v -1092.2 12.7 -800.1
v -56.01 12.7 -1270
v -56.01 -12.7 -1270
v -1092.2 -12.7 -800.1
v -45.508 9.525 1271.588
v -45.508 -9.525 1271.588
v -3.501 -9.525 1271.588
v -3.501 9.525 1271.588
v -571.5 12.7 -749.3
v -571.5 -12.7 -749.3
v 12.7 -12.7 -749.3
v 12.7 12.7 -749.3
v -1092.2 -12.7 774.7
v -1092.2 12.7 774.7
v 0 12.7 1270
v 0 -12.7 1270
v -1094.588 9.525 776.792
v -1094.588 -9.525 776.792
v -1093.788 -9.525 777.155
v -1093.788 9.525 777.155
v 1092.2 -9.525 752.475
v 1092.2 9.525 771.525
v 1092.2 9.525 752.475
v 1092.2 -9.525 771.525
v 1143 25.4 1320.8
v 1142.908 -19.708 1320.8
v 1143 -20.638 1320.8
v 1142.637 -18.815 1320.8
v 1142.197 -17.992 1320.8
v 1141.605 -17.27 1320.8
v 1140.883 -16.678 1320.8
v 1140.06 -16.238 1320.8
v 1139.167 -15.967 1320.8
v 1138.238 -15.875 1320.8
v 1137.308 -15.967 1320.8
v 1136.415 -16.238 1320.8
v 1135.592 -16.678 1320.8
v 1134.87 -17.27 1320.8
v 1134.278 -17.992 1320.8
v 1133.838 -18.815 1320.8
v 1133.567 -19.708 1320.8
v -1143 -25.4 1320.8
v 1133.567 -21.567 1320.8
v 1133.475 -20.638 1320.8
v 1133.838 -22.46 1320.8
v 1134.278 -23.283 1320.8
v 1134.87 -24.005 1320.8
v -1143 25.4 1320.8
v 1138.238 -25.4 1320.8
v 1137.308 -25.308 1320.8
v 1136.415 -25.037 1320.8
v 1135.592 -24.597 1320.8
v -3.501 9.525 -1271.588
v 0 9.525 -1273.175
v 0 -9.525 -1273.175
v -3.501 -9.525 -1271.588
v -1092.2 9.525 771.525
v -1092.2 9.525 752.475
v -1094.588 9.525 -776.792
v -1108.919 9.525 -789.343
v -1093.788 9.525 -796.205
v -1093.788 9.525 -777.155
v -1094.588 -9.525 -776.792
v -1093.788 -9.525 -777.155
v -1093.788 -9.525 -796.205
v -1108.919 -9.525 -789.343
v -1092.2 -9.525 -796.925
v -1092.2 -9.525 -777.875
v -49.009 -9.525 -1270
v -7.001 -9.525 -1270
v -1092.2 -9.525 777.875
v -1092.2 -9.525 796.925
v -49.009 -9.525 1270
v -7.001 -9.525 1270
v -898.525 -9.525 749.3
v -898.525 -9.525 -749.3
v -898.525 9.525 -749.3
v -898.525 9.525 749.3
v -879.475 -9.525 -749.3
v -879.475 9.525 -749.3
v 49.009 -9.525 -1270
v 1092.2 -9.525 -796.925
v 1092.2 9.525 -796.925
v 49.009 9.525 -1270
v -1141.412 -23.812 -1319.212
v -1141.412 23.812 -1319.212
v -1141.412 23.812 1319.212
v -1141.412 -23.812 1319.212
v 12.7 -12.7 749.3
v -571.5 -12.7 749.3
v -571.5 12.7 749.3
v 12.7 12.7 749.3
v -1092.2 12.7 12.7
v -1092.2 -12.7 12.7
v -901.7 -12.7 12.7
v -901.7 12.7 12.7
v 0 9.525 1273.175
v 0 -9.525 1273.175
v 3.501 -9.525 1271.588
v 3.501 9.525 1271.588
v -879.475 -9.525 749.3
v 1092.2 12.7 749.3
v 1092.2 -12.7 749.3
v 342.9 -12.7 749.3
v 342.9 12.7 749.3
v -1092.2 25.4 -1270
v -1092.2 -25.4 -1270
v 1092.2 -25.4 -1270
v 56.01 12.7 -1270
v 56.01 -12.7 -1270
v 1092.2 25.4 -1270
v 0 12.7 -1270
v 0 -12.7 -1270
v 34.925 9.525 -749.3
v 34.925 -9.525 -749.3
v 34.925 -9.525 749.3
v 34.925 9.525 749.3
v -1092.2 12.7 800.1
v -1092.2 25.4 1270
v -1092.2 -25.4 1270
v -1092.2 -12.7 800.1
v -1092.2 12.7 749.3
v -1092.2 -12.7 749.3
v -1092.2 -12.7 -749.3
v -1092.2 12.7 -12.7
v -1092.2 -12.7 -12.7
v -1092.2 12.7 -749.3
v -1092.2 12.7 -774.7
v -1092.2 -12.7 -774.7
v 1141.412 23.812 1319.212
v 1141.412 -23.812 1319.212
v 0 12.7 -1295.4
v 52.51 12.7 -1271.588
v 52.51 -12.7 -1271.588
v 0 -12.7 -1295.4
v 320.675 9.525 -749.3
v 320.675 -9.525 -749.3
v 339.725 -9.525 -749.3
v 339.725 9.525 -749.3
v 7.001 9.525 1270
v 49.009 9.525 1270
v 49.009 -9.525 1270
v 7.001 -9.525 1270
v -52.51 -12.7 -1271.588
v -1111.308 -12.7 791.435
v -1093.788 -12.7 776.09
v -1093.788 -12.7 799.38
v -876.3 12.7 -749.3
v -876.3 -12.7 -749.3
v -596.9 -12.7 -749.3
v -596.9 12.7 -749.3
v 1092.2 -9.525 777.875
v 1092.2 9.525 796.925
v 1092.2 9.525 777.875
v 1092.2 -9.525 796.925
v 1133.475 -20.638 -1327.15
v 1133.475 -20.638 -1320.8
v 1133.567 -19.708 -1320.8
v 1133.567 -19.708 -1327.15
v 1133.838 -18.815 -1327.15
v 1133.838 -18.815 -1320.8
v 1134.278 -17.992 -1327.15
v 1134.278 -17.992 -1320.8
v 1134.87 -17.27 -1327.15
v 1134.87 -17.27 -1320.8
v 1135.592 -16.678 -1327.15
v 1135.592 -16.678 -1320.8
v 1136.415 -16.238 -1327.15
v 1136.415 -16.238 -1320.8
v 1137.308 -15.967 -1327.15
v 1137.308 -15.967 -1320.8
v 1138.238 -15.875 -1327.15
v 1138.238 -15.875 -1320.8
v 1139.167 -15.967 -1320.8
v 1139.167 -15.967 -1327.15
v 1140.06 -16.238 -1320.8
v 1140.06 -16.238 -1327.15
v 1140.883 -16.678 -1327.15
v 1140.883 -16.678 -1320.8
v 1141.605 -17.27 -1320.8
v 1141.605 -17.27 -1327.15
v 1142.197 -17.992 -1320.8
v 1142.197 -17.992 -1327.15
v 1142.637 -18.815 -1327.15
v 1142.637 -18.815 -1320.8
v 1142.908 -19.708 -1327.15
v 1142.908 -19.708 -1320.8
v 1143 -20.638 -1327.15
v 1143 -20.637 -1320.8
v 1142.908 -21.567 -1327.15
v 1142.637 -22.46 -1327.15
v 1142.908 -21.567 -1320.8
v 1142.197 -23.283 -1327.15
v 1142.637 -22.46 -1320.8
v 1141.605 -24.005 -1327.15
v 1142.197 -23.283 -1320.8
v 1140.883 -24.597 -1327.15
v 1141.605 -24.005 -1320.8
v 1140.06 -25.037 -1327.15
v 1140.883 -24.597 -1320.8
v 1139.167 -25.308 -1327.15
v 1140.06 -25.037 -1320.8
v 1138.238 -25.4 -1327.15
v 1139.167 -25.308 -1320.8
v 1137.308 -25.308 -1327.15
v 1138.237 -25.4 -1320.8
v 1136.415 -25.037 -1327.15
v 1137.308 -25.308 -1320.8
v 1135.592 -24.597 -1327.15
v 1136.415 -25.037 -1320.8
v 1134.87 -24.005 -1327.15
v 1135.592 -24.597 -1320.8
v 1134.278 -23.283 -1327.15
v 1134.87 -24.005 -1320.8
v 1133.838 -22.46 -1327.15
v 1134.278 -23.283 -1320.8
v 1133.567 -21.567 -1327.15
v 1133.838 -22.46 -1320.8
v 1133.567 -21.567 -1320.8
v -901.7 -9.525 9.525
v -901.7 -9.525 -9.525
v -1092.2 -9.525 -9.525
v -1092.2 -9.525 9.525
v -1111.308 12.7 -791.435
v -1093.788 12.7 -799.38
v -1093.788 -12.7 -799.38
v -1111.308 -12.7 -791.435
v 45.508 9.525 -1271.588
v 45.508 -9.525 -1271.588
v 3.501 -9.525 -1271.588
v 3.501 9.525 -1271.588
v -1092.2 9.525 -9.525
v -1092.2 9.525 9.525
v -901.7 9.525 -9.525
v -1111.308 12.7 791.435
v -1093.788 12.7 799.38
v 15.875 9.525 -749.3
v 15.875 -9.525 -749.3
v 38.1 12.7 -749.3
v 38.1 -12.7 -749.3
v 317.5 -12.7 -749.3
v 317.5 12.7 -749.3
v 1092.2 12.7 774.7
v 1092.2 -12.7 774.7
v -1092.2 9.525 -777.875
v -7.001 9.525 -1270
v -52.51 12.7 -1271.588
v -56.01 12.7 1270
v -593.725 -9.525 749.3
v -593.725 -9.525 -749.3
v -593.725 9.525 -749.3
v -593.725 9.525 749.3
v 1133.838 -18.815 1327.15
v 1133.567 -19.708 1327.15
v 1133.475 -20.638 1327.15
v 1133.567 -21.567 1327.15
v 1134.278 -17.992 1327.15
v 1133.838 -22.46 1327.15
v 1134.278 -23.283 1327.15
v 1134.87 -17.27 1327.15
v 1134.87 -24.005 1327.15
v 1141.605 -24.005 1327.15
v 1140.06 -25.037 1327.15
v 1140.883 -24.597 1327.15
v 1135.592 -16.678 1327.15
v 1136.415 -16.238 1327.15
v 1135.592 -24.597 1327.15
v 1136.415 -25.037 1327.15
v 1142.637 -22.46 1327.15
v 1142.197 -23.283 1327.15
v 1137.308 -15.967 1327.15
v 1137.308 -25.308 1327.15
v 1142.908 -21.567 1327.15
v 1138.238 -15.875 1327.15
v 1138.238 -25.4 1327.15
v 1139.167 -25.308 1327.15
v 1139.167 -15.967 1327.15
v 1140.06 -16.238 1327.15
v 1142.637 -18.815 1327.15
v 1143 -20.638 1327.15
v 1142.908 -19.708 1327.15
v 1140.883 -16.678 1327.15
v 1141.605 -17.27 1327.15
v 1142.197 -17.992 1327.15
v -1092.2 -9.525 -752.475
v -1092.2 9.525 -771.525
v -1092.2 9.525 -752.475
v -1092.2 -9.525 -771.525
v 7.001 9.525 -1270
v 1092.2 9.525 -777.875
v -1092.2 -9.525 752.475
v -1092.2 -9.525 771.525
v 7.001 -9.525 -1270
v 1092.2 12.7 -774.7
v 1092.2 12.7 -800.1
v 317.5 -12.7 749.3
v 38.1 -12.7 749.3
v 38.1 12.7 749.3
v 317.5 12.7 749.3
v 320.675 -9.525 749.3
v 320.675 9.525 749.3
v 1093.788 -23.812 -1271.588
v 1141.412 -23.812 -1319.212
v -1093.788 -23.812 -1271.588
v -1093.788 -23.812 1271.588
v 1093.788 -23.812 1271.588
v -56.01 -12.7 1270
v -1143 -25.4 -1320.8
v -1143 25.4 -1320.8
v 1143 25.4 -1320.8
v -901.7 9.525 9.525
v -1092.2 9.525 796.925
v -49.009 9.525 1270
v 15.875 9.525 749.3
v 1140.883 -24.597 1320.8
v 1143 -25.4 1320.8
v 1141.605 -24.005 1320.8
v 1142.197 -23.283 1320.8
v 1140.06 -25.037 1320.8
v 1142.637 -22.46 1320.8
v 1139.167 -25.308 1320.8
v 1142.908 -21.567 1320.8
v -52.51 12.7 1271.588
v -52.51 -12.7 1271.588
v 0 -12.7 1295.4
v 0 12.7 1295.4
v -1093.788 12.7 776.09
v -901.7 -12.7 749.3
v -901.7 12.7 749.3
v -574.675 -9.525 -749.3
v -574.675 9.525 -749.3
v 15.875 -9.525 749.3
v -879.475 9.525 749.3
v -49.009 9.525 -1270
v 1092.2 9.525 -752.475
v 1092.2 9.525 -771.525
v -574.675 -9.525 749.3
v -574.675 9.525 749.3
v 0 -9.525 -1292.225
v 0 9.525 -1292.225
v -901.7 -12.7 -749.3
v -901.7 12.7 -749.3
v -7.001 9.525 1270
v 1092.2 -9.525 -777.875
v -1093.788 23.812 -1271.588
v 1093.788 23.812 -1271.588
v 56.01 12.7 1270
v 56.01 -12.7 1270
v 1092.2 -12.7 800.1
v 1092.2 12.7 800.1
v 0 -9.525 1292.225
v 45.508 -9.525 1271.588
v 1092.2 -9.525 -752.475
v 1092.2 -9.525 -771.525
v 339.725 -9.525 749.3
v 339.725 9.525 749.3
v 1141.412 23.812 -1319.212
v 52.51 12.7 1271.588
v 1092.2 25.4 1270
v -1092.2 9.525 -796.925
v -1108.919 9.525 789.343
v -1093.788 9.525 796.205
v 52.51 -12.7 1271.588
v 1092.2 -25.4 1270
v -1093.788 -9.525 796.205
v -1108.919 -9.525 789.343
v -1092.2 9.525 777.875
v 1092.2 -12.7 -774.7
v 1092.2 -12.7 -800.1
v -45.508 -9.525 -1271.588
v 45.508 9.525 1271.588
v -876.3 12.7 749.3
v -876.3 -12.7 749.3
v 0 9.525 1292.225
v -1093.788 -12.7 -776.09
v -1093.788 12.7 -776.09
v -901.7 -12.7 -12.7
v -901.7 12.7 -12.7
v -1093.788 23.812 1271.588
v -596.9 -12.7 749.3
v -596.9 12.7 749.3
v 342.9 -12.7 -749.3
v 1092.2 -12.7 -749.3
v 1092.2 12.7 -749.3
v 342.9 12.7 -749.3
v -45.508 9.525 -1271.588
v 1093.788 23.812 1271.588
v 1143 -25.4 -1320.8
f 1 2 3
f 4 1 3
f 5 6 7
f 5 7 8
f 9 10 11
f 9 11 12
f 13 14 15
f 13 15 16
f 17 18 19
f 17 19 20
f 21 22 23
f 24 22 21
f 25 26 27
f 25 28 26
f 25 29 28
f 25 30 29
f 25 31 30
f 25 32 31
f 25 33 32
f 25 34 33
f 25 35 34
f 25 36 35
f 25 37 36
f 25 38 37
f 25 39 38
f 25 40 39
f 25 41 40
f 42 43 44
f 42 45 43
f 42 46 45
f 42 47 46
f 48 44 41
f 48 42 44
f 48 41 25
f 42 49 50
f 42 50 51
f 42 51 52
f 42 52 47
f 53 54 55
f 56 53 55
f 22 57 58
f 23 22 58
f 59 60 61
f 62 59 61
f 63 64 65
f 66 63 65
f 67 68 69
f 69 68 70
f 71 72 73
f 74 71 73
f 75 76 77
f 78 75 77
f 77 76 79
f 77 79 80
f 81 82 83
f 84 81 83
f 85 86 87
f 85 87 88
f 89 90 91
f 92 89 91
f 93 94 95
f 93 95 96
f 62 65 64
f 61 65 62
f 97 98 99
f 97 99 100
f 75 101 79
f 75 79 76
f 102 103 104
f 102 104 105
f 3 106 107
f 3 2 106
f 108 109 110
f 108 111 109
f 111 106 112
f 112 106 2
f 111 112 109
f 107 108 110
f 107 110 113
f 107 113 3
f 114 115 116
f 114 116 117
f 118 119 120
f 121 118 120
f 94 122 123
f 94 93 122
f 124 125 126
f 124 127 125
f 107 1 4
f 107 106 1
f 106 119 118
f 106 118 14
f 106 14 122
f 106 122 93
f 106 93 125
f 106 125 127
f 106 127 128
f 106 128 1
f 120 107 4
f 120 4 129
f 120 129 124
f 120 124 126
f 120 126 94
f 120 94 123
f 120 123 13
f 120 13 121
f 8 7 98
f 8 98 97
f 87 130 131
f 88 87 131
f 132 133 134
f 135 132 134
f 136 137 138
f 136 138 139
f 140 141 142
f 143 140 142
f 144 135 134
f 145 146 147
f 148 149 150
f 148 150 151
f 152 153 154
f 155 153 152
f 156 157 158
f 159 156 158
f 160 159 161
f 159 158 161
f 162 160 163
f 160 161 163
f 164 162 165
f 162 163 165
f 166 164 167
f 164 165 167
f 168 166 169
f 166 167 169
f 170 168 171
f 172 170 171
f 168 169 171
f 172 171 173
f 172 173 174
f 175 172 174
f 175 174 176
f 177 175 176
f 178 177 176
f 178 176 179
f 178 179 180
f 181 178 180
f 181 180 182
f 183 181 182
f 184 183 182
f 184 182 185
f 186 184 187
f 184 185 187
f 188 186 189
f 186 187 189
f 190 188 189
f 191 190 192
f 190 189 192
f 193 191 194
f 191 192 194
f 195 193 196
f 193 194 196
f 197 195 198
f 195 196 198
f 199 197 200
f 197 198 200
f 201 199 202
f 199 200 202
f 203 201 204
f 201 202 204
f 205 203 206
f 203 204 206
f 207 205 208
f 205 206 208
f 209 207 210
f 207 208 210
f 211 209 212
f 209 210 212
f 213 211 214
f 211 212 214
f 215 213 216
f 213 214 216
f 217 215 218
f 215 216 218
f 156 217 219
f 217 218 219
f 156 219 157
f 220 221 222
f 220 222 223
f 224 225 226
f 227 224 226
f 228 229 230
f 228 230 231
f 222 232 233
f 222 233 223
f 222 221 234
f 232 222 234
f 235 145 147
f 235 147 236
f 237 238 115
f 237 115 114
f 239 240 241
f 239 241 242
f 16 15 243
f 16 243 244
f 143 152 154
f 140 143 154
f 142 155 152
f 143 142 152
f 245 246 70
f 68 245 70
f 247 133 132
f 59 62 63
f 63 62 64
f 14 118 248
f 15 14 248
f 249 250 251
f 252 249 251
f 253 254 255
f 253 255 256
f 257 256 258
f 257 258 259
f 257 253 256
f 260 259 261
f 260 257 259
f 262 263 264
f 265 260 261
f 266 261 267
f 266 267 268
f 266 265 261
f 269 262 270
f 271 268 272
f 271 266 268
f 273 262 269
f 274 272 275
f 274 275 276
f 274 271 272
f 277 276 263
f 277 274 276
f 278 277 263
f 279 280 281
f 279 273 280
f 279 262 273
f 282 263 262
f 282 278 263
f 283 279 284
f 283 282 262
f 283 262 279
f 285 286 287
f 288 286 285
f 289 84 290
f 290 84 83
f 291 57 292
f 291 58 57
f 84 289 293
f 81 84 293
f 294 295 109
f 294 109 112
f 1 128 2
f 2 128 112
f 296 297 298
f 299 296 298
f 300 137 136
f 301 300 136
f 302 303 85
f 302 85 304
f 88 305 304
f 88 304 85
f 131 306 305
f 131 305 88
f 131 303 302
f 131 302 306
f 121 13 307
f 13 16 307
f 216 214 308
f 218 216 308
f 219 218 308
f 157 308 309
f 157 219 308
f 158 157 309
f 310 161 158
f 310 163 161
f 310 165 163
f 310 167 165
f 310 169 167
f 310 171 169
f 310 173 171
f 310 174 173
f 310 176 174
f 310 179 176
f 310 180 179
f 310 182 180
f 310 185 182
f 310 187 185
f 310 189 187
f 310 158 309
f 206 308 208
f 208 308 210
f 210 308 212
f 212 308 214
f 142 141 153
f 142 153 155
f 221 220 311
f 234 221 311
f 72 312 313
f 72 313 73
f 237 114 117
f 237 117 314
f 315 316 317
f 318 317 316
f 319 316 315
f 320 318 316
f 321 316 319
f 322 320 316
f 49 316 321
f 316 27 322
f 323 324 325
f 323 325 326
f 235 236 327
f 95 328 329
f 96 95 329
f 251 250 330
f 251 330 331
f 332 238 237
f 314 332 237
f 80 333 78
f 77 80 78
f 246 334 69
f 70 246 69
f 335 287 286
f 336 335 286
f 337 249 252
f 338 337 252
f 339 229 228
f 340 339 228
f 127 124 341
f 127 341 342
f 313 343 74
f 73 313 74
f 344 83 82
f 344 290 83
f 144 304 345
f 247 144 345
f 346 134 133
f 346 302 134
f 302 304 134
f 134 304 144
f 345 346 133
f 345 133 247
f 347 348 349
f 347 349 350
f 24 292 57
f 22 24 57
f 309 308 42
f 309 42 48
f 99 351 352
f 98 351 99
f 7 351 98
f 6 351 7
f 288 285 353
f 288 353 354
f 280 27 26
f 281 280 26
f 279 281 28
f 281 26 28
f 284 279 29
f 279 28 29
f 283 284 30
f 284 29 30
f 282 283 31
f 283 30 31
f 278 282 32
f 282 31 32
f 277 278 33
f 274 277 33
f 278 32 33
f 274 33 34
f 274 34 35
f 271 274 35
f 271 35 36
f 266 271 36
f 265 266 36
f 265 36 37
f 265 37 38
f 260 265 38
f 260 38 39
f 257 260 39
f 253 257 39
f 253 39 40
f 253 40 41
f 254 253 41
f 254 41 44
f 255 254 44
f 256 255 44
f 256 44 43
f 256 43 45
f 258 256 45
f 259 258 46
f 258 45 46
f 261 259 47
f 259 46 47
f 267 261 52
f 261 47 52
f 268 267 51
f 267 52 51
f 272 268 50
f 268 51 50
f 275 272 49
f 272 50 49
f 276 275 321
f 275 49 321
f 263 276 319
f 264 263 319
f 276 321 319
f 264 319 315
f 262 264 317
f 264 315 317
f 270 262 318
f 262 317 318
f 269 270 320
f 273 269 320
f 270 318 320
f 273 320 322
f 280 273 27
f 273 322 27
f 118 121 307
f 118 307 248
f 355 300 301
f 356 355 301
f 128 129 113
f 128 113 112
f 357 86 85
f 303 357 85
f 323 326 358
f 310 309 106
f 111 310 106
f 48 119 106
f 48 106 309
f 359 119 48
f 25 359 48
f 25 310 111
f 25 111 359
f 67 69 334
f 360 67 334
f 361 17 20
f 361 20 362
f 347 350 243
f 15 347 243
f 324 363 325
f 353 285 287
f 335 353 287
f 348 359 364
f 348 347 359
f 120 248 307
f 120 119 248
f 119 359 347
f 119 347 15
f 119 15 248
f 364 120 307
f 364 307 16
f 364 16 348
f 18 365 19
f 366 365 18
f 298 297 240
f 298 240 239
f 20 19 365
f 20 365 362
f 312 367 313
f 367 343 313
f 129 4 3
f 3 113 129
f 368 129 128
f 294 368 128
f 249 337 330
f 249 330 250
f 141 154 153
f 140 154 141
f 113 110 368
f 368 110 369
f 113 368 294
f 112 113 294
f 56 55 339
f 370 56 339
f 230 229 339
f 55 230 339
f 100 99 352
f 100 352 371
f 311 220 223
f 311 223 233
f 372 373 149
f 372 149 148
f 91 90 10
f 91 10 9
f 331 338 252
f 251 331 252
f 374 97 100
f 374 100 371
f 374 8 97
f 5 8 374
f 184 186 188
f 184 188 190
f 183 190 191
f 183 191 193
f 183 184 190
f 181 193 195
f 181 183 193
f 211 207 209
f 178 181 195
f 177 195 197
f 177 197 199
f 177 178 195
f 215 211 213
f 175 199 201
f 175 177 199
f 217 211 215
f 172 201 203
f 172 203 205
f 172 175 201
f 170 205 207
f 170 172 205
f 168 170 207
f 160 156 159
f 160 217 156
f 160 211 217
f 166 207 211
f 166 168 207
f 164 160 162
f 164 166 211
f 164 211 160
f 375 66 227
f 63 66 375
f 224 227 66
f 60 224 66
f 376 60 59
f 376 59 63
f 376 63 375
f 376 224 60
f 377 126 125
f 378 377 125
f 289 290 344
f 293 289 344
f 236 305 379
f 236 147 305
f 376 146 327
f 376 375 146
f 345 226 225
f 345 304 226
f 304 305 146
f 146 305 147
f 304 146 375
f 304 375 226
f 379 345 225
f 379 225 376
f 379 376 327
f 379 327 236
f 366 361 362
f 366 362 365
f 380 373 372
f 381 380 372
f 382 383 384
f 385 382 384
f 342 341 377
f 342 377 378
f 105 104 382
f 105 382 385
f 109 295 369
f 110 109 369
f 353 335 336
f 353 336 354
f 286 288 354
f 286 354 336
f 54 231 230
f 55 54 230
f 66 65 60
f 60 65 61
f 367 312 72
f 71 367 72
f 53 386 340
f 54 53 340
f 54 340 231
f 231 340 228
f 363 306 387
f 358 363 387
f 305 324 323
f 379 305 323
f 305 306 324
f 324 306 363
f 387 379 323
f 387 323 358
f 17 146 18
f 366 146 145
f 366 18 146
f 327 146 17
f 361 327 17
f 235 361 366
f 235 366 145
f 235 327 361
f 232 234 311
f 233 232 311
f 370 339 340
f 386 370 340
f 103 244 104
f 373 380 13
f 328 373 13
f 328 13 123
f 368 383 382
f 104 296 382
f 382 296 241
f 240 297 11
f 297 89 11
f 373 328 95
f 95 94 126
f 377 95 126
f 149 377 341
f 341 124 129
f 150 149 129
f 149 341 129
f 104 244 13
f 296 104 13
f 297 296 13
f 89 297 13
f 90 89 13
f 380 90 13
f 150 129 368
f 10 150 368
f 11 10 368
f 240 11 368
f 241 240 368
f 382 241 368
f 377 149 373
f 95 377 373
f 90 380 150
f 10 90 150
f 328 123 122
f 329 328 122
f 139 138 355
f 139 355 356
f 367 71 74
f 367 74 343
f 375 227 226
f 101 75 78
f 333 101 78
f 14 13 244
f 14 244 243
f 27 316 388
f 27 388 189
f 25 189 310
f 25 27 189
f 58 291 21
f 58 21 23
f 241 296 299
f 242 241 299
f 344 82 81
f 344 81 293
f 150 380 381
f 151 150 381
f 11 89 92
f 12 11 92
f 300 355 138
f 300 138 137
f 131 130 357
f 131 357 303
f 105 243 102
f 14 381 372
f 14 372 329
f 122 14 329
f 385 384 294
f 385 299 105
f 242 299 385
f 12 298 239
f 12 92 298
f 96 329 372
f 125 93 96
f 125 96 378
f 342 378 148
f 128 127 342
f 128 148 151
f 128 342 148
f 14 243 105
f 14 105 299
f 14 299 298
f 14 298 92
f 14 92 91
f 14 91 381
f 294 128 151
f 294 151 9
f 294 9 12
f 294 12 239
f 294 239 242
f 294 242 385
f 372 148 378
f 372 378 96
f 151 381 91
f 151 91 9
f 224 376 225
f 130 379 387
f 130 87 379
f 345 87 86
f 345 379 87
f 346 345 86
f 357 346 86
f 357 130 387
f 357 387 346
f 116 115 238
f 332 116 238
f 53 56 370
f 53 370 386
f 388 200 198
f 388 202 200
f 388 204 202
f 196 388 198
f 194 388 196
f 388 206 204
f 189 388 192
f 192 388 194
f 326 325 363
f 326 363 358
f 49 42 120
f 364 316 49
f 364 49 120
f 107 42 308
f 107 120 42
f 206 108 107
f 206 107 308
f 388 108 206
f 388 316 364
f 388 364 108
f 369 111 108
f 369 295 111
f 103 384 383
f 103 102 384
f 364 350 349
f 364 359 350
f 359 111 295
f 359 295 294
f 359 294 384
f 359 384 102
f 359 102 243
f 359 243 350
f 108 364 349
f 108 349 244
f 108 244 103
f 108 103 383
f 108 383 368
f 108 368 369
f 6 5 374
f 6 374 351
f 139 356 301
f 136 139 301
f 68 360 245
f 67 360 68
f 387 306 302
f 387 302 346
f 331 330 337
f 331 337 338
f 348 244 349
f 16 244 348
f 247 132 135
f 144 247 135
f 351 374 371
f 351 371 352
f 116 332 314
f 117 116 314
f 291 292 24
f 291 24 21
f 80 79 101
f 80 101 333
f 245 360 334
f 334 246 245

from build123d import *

# Parameters (mm, degrees)
SKETCH1_W           = 50.8
SKETCH1_H           = 50.8
SKETCH1_W_2         = 47.625
SKETCH1_H_2         = 47.625
SKETCH3_R           = 4.7625
BOSS_EXTRUDE1_DEPTH = 6.35
SKETCH4_R           = 4.7625
BOSS_EXTRUDE2_DEPTH = 6.35
SKETCH5_W           = 25.4
SKETCH5_H           = 25.4
SKETCH5_W_2         = 19.05
SKETCH5_H_2         = 19.05
BOSS_EXTRUDE3_DEPTH = 2184.4
SKETCH6_W           = 25.4
SKETCH6_H           = 25.4
SKETCH6_W_2         = 19.05
SKETCH6_H_2         = 19.05
BOSS_EXTRUDE4_DEPTH = 1498.6
SKETCH9_W           = 25.4
SKETCH9_H           = 25.4
SKETCH9_W_2         = 19.05
SKETCH9_H_2         = 19.05
SKETCH7_W           = 25.4
SKETCH7_H           = 25.4
SKETCH7_W_2         = 19.05
SKETCH7_H_2         = 19.05
SKETCH11_W          = 25.4
SKETCH11_H          = 25.4
SKETCH11_W_2        = 19.05
SKETCH11_H_2        = 19.05
BOSS_EXTRUDE5_DEPTH = 190.5


with BuildPart() as part:
    # Sweep1: sweep along a path in Sketch2
    with BuildLine(Plane(origin=(0, 0, 0), x_dir=(1, 0, 0), z_dir=(0, 1, 0))) as sweep1_path:
        Line((-1117.6, 1295.4), (1117.6, 1295.4))
        Line((1117.6, 1295.4), (1117.6, -1295.4))
        Line((1117.6, -1295.4), (-1117.6, -1295.4))
        Line((-1117.6, -1295.4), (-1117.6, 1295.4))
    # Sketch1 → Sweep1 (sweep)
    with BuildSketch(Plane.XY):
        with Locations((1117.6, 0)):
            Rectangle(SKETCH1_W, SKETCH1_H)
        with Locations((1117.6, 0)):
            Rectangle(SKETCH1_W_2, SKETCH1_H_2, mode=Mode.SUBTRACT)
    sweep(path=sweep1_path.line, transition=Transition.RIGHT)

    # Sketch3 → Boss-Extrude1 (add)
    with BuildSketch(Plane(origin=(0, 0, -1320.8), x_dir=(-1, 0, 0), z_dir=(0, 0, -1))):
        with Locations((-1138.2375, -20.6375)):
            Circle(SKETCH3_R)
    extrude(amount=BOSS_EXTRUDE1_DEPTH)

    # Sketch4 → Boss-Extrude2 (add)
    with BuildSketch(Plane.XY.offset(1320.8)):
        with Locations((1138.2375, -20.6375)):
            Circle(SKETCH4_R)
    extrude(amount=BOSS_EXTRUDE2_DEPTH)

    # Sketch5 → Boss-Extrude3 (add)
    with BuildSketch(Plane(origin=(-1092.2, 0, 0), x_dir=(0, 0, -1), z_dir=(1, 0, 0))):
        with Locations((-762, 0)):
            Rectangle(SKETCH5_W, SKETCH5_H)
        with Locations((-762, 0)):
            Rectangle(SKETCH5_W_2, SKETCH5_H_2, mode=Mode.SUBTRACT)
        with Locations((762, 0)):
            Rectangle(SKETCH5_W, SKETCH5_H)
        with Locations((762, 0)):
            Rectangle(SKETCH5_W_2, SKETCH5_H_2, mode=Mode.SUBTRACT)
    extrude(amount=BOSS_EXTRUDE3_DEPTH)

    # Sketch6 → Boss-Extrude4 (add)
    with BuildSketch(Plane(origin=(0, 0, 749.3), x_dir=(-1, 0, 0), z_dir=(0, 0, -1))):
        with Locations((-330.2, 0)):
            Rectangle(SKETCH6_W, SKETCH6_H)
        with Locations((-330.2, 0)):
            Rectangle(SKETCH6_W_2, SKETCH6_H_2, mode=Mode.SUBTRACT)
        with Locations((-25.4, 0)):
            Rectangle(SKETCH6_W, SKETCH6_H)
        with Locations((-25.4, 0)):
            Rectangle(SKETCH6_W_2, SKETCH6_H_2, mode=Mode.SUBTRACT)
        with Locations((584.2, 0)):
            Rectangle(SKETCH6_W, SKETCH6_H)
        with Locations((584.2, 0)):
            Rectangle(SKETCH6_W_2, SKETCH6_H_2, mode=Mode.SUBTRACT)
        with Locations((889, 0)):
            Rectangle(SKETCH6_W, SKETCH6_H)
        with Locations((889, 0)):
            Rectangle(SKETCH6_W_2, SKETCH6_H_2, mode=Mode.SUBTRACT)
    extrude(amount=BOSS_EXTRUDE4_DEPTH)

    # Sweep2: sweep along a path in Sketch10
    with BuildLine(Plane(origin=(0, 25.4, 0), x_dir=(1, 0, 0), z_dir=(0, 1, 0))) as sweep2_path:
        Line((1092.2, -774.7), (0, -1270))
        Line((0, -1270), (-1092.2, -774.7))
    # Sketch9 → Sweep2 (sweep)
    with BuildSketch(Plane.ZY.offset(-1092.2)):
        with Locations((787.4, 0)):
            Rectangle(SKETCH9_W, SKETCH9_H)
        with Locations((787.4, 0)):
            Rectangle(SKETCH9_W_2, SKETCH9_H_2, mode=Mode.SUBTRACT)
    sweep(path=sweep2_path.line, transition=Transition.RIGHT)

    # Sweep4: sweep along a path in Sketch8
    with BuildLine(Plane(origin=(0, 25.4, 0), x_dir=(1, 0, 0), z_dir=(0, 1, 0))) as sweep4_path:
        Line((-1092.2, 774.7), (0, 1270))
        Line((0, 1270), (1092.2, 774.7))
    # Sketch7 → Sweep4 (sweep)
    with BuildSketch(Plane.ZY.offset(-1092.2)):
        with Locations((-787.4, 0)):
            Rectangle(SKETCH7_W, SKETCH7_H)
        with Locations((-787.4, 0)):
            Rectangle(SKETCH7_W_2, SKETCH7_H_2, mode=Mode.SUBTRACT)
    sweep(path=sweep4_path.line, transition=Transition.RIGHT)

    # Sketch11 → Boss-Extrude5 (add)
    with BuildSketch(Plane.ZY.offset(901.7)):
        Rectangle(SKETCH11_W, SKETCH11_H)
        Rectangle(SKETCH11_W_2, SKETCH11_H_2, mode=Mode.SUBTRACT)
    extrude(amount=BOSS_EXTRUDE5_DEPTH)


solid = part.part
